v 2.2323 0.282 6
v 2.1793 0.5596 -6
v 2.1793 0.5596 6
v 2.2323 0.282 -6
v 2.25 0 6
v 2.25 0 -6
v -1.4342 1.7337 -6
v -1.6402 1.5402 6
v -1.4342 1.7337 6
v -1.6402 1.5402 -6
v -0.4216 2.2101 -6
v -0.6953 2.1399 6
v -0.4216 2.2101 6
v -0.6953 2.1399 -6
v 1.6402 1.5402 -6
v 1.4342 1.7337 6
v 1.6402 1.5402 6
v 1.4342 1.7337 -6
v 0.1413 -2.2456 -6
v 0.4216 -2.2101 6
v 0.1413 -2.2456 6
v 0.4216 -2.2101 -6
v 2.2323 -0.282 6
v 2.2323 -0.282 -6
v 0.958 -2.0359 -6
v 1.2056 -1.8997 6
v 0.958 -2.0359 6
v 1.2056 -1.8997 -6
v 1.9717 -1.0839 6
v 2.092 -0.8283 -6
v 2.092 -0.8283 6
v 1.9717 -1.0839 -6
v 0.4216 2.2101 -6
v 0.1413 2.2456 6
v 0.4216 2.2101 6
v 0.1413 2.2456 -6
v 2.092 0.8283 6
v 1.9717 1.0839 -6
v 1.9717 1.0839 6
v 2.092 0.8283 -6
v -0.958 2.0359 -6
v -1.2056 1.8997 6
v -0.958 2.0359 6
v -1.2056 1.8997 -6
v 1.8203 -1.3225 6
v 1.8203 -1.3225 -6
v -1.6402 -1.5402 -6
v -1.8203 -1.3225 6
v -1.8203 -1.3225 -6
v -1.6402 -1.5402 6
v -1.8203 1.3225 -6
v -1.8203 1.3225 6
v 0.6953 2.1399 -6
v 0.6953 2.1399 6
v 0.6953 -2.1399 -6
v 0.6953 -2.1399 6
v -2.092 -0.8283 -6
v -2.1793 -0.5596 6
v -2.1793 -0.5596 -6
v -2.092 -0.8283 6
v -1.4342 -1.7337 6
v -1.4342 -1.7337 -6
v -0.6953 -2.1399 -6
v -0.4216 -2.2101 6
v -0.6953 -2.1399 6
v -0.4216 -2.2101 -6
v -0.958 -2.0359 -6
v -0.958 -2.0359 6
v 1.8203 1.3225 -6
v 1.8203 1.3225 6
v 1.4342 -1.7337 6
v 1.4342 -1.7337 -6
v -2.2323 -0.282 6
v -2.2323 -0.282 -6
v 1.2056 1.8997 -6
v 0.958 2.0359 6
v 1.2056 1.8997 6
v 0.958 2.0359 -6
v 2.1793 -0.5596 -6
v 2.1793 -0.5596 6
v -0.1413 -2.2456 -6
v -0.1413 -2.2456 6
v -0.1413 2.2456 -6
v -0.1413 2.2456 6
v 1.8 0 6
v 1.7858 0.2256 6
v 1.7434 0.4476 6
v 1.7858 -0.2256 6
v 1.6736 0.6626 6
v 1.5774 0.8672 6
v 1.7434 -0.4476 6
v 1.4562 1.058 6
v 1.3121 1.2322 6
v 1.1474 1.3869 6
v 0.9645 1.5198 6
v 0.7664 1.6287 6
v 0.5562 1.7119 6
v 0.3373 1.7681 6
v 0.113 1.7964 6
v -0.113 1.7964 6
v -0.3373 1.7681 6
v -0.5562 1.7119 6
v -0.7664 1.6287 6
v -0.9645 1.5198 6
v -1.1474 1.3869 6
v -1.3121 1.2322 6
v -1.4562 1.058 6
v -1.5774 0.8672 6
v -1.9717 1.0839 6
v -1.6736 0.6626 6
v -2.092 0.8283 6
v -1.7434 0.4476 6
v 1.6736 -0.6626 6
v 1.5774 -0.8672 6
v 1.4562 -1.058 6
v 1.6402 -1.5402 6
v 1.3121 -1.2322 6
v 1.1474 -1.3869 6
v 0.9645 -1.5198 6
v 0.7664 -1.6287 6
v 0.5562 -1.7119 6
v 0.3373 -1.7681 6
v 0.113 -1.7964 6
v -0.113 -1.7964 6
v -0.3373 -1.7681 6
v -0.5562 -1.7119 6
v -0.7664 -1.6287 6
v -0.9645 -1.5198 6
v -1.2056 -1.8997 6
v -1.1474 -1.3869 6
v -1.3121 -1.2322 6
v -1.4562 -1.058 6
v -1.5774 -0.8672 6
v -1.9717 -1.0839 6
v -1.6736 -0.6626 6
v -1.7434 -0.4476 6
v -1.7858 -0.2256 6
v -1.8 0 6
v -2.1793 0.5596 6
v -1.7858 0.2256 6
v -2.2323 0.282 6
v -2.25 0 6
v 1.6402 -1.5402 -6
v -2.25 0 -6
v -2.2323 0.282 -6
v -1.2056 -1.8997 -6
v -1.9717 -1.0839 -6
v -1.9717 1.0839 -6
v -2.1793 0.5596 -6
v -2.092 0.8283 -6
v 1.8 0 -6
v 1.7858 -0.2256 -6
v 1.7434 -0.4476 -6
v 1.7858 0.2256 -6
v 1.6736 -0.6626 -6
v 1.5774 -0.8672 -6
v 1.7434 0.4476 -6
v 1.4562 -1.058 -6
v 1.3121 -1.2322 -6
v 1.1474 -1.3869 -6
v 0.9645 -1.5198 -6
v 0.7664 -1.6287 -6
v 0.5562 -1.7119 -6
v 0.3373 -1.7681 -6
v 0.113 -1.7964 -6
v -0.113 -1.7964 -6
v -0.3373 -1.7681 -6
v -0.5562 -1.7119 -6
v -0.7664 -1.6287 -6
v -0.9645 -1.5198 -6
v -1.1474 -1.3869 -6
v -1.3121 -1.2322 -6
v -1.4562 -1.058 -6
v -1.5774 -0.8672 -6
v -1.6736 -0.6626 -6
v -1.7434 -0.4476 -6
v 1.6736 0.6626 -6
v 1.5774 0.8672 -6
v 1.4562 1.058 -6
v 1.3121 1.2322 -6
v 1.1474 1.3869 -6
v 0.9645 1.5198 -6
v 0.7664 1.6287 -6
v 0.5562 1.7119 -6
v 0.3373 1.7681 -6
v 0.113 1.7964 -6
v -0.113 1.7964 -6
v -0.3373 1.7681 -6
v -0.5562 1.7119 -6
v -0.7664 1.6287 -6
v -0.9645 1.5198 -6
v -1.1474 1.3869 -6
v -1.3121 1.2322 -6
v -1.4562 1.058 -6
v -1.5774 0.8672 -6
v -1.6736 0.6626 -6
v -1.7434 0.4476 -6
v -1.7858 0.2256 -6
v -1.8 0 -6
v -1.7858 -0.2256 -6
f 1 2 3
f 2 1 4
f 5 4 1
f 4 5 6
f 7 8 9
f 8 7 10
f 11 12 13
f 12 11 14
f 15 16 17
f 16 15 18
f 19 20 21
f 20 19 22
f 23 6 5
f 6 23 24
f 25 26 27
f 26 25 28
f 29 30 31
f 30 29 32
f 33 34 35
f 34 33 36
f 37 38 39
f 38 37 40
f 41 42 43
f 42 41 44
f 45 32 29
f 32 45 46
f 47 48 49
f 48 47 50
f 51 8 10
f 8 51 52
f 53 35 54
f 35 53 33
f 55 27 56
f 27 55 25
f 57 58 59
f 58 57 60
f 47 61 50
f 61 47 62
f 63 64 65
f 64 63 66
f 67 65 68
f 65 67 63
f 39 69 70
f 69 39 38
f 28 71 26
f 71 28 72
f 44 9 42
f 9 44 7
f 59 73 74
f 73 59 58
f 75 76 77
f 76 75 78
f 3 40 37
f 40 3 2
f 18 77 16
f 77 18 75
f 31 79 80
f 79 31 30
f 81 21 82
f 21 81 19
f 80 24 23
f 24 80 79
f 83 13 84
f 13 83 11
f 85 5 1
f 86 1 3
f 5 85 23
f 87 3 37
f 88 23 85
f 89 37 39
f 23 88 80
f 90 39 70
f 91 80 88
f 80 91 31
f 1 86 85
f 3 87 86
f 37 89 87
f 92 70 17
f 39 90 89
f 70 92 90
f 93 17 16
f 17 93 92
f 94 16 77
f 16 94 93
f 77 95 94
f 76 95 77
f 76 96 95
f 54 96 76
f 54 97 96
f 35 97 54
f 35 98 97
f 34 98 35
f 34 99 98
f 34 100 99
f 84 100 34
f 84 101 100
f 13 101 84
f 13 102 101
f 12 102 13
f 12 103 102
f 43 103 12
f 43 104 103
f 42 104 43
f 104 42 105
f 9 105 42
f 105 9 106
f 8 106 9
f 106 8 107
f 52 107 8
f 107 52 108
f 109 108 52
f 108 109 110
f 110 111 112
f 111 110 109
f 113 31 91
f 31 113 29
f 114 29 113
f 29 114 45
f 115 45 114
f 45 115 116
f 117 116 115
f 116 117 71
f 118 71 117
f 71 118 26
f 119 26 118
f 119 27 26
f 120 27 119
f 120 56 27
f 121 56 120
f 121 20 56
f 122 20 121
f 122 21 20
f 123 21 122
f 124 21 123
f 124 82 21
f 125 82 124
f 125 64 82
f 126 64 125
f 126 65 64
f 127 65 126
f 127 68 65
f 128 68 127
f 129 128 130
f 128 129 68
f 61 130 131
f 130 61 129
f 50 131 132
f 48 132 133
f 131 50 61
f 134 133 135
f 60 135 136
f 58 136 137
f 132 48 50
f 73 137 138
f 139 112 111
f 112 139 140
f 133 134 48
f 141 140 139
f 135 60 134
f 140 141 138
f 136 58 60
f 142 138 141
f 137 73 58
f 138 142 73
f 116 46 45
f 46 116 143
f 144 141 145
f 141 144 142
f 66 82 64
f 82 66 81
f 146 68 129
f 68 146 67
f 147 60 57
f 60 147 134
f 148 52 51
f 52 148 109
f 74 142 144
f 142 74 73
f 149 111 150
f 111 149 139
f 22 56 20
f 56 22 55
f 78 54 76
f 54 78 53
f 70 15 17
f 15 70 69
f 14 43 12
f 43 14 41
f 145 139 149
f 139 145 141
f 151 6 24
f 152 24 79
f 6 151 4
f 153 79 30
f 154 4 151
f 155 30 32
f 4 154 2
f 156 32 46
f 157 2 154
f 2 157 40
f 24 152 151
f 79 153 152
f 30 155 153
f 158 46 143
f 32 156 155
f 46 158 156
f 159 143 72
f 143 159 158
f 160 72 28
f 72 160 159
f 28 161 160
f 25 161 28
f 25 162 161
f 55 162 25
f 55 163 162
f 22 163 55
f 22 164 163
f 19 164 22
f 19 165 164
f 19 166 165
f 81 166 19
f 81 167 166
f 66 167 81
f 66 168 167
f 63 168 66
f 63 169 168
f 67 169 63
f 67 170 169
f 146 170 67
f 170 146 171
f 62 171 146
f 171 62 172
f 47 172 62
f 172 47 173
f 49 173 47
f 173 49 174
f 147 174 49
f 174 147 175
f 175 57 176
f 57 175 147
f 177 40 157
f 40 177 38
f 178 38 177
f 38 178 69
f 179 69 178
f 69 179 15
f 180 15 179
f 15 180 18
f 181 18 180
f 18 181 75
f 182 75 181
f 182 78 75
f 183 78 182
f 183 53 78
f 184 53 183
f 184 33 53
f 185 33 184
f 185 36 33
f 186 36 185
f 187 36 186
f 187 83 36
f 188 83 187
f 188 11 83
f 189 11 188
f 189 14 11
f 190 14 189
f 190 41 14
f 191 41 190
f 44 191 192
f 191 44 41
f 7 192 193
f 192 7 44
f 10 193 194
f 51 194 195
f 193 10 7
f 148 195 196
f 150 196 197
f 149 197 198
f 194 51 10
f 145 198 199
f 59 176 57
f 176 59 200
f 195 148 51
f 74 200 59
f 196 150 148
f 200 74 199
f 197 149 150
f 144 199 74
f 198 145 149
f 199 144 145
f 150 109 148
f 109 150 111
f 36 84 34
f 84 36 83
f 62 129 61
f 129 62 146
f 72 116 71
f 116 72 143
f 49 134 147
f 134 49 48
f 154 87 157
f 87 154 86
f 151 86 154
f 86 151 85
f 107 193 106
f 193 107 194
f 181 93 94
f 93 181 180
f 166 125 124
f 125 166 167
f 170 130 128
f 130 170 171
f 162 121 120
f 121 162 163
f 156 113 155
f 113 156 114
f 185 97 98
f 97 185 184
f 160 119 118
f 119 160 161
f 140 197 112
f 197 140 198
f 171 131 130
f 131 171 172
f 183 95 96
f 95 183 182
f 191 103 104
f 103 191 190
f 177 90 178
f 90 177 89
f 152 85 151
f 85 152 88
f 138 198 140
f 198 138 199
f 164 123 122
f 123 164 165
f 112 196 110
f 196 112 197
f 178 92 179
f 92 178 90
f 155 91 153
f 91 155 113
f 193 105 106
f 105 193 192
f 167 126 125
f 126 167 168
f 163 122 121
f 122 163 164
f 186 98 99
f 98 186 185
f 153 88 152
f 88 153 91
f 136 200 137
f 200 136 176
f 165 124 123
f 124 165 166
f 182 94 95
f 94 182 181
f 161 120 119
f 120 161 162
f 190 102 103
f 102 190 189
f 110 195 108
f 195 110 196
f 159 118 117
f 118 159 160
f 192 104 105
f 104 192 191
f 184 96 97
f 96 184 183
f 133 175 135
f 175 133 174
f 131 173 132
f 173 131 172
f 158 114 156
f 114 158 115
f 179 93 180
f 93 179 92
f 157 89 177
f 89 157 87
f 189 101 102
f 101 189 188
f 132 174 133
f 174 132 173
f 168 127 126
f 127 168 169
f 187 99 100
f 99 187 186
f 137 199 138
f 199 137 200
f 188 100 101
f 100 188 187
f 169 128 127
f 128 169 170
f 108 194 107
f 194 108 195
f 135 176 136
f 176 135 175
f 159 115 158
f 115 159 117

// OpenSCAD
$fn = 50;


difference() {
	union() {
		translate(v = [0, 0, -6.0000000000]) {
			cylinder(h = 12, r = 2.2500000000);
		}
	}
	union() {
		#translate(v = [0, 0, -100.0000000000]) {
			cylinder(h = 200, r = 1.8000000000);
		}
	}
}
